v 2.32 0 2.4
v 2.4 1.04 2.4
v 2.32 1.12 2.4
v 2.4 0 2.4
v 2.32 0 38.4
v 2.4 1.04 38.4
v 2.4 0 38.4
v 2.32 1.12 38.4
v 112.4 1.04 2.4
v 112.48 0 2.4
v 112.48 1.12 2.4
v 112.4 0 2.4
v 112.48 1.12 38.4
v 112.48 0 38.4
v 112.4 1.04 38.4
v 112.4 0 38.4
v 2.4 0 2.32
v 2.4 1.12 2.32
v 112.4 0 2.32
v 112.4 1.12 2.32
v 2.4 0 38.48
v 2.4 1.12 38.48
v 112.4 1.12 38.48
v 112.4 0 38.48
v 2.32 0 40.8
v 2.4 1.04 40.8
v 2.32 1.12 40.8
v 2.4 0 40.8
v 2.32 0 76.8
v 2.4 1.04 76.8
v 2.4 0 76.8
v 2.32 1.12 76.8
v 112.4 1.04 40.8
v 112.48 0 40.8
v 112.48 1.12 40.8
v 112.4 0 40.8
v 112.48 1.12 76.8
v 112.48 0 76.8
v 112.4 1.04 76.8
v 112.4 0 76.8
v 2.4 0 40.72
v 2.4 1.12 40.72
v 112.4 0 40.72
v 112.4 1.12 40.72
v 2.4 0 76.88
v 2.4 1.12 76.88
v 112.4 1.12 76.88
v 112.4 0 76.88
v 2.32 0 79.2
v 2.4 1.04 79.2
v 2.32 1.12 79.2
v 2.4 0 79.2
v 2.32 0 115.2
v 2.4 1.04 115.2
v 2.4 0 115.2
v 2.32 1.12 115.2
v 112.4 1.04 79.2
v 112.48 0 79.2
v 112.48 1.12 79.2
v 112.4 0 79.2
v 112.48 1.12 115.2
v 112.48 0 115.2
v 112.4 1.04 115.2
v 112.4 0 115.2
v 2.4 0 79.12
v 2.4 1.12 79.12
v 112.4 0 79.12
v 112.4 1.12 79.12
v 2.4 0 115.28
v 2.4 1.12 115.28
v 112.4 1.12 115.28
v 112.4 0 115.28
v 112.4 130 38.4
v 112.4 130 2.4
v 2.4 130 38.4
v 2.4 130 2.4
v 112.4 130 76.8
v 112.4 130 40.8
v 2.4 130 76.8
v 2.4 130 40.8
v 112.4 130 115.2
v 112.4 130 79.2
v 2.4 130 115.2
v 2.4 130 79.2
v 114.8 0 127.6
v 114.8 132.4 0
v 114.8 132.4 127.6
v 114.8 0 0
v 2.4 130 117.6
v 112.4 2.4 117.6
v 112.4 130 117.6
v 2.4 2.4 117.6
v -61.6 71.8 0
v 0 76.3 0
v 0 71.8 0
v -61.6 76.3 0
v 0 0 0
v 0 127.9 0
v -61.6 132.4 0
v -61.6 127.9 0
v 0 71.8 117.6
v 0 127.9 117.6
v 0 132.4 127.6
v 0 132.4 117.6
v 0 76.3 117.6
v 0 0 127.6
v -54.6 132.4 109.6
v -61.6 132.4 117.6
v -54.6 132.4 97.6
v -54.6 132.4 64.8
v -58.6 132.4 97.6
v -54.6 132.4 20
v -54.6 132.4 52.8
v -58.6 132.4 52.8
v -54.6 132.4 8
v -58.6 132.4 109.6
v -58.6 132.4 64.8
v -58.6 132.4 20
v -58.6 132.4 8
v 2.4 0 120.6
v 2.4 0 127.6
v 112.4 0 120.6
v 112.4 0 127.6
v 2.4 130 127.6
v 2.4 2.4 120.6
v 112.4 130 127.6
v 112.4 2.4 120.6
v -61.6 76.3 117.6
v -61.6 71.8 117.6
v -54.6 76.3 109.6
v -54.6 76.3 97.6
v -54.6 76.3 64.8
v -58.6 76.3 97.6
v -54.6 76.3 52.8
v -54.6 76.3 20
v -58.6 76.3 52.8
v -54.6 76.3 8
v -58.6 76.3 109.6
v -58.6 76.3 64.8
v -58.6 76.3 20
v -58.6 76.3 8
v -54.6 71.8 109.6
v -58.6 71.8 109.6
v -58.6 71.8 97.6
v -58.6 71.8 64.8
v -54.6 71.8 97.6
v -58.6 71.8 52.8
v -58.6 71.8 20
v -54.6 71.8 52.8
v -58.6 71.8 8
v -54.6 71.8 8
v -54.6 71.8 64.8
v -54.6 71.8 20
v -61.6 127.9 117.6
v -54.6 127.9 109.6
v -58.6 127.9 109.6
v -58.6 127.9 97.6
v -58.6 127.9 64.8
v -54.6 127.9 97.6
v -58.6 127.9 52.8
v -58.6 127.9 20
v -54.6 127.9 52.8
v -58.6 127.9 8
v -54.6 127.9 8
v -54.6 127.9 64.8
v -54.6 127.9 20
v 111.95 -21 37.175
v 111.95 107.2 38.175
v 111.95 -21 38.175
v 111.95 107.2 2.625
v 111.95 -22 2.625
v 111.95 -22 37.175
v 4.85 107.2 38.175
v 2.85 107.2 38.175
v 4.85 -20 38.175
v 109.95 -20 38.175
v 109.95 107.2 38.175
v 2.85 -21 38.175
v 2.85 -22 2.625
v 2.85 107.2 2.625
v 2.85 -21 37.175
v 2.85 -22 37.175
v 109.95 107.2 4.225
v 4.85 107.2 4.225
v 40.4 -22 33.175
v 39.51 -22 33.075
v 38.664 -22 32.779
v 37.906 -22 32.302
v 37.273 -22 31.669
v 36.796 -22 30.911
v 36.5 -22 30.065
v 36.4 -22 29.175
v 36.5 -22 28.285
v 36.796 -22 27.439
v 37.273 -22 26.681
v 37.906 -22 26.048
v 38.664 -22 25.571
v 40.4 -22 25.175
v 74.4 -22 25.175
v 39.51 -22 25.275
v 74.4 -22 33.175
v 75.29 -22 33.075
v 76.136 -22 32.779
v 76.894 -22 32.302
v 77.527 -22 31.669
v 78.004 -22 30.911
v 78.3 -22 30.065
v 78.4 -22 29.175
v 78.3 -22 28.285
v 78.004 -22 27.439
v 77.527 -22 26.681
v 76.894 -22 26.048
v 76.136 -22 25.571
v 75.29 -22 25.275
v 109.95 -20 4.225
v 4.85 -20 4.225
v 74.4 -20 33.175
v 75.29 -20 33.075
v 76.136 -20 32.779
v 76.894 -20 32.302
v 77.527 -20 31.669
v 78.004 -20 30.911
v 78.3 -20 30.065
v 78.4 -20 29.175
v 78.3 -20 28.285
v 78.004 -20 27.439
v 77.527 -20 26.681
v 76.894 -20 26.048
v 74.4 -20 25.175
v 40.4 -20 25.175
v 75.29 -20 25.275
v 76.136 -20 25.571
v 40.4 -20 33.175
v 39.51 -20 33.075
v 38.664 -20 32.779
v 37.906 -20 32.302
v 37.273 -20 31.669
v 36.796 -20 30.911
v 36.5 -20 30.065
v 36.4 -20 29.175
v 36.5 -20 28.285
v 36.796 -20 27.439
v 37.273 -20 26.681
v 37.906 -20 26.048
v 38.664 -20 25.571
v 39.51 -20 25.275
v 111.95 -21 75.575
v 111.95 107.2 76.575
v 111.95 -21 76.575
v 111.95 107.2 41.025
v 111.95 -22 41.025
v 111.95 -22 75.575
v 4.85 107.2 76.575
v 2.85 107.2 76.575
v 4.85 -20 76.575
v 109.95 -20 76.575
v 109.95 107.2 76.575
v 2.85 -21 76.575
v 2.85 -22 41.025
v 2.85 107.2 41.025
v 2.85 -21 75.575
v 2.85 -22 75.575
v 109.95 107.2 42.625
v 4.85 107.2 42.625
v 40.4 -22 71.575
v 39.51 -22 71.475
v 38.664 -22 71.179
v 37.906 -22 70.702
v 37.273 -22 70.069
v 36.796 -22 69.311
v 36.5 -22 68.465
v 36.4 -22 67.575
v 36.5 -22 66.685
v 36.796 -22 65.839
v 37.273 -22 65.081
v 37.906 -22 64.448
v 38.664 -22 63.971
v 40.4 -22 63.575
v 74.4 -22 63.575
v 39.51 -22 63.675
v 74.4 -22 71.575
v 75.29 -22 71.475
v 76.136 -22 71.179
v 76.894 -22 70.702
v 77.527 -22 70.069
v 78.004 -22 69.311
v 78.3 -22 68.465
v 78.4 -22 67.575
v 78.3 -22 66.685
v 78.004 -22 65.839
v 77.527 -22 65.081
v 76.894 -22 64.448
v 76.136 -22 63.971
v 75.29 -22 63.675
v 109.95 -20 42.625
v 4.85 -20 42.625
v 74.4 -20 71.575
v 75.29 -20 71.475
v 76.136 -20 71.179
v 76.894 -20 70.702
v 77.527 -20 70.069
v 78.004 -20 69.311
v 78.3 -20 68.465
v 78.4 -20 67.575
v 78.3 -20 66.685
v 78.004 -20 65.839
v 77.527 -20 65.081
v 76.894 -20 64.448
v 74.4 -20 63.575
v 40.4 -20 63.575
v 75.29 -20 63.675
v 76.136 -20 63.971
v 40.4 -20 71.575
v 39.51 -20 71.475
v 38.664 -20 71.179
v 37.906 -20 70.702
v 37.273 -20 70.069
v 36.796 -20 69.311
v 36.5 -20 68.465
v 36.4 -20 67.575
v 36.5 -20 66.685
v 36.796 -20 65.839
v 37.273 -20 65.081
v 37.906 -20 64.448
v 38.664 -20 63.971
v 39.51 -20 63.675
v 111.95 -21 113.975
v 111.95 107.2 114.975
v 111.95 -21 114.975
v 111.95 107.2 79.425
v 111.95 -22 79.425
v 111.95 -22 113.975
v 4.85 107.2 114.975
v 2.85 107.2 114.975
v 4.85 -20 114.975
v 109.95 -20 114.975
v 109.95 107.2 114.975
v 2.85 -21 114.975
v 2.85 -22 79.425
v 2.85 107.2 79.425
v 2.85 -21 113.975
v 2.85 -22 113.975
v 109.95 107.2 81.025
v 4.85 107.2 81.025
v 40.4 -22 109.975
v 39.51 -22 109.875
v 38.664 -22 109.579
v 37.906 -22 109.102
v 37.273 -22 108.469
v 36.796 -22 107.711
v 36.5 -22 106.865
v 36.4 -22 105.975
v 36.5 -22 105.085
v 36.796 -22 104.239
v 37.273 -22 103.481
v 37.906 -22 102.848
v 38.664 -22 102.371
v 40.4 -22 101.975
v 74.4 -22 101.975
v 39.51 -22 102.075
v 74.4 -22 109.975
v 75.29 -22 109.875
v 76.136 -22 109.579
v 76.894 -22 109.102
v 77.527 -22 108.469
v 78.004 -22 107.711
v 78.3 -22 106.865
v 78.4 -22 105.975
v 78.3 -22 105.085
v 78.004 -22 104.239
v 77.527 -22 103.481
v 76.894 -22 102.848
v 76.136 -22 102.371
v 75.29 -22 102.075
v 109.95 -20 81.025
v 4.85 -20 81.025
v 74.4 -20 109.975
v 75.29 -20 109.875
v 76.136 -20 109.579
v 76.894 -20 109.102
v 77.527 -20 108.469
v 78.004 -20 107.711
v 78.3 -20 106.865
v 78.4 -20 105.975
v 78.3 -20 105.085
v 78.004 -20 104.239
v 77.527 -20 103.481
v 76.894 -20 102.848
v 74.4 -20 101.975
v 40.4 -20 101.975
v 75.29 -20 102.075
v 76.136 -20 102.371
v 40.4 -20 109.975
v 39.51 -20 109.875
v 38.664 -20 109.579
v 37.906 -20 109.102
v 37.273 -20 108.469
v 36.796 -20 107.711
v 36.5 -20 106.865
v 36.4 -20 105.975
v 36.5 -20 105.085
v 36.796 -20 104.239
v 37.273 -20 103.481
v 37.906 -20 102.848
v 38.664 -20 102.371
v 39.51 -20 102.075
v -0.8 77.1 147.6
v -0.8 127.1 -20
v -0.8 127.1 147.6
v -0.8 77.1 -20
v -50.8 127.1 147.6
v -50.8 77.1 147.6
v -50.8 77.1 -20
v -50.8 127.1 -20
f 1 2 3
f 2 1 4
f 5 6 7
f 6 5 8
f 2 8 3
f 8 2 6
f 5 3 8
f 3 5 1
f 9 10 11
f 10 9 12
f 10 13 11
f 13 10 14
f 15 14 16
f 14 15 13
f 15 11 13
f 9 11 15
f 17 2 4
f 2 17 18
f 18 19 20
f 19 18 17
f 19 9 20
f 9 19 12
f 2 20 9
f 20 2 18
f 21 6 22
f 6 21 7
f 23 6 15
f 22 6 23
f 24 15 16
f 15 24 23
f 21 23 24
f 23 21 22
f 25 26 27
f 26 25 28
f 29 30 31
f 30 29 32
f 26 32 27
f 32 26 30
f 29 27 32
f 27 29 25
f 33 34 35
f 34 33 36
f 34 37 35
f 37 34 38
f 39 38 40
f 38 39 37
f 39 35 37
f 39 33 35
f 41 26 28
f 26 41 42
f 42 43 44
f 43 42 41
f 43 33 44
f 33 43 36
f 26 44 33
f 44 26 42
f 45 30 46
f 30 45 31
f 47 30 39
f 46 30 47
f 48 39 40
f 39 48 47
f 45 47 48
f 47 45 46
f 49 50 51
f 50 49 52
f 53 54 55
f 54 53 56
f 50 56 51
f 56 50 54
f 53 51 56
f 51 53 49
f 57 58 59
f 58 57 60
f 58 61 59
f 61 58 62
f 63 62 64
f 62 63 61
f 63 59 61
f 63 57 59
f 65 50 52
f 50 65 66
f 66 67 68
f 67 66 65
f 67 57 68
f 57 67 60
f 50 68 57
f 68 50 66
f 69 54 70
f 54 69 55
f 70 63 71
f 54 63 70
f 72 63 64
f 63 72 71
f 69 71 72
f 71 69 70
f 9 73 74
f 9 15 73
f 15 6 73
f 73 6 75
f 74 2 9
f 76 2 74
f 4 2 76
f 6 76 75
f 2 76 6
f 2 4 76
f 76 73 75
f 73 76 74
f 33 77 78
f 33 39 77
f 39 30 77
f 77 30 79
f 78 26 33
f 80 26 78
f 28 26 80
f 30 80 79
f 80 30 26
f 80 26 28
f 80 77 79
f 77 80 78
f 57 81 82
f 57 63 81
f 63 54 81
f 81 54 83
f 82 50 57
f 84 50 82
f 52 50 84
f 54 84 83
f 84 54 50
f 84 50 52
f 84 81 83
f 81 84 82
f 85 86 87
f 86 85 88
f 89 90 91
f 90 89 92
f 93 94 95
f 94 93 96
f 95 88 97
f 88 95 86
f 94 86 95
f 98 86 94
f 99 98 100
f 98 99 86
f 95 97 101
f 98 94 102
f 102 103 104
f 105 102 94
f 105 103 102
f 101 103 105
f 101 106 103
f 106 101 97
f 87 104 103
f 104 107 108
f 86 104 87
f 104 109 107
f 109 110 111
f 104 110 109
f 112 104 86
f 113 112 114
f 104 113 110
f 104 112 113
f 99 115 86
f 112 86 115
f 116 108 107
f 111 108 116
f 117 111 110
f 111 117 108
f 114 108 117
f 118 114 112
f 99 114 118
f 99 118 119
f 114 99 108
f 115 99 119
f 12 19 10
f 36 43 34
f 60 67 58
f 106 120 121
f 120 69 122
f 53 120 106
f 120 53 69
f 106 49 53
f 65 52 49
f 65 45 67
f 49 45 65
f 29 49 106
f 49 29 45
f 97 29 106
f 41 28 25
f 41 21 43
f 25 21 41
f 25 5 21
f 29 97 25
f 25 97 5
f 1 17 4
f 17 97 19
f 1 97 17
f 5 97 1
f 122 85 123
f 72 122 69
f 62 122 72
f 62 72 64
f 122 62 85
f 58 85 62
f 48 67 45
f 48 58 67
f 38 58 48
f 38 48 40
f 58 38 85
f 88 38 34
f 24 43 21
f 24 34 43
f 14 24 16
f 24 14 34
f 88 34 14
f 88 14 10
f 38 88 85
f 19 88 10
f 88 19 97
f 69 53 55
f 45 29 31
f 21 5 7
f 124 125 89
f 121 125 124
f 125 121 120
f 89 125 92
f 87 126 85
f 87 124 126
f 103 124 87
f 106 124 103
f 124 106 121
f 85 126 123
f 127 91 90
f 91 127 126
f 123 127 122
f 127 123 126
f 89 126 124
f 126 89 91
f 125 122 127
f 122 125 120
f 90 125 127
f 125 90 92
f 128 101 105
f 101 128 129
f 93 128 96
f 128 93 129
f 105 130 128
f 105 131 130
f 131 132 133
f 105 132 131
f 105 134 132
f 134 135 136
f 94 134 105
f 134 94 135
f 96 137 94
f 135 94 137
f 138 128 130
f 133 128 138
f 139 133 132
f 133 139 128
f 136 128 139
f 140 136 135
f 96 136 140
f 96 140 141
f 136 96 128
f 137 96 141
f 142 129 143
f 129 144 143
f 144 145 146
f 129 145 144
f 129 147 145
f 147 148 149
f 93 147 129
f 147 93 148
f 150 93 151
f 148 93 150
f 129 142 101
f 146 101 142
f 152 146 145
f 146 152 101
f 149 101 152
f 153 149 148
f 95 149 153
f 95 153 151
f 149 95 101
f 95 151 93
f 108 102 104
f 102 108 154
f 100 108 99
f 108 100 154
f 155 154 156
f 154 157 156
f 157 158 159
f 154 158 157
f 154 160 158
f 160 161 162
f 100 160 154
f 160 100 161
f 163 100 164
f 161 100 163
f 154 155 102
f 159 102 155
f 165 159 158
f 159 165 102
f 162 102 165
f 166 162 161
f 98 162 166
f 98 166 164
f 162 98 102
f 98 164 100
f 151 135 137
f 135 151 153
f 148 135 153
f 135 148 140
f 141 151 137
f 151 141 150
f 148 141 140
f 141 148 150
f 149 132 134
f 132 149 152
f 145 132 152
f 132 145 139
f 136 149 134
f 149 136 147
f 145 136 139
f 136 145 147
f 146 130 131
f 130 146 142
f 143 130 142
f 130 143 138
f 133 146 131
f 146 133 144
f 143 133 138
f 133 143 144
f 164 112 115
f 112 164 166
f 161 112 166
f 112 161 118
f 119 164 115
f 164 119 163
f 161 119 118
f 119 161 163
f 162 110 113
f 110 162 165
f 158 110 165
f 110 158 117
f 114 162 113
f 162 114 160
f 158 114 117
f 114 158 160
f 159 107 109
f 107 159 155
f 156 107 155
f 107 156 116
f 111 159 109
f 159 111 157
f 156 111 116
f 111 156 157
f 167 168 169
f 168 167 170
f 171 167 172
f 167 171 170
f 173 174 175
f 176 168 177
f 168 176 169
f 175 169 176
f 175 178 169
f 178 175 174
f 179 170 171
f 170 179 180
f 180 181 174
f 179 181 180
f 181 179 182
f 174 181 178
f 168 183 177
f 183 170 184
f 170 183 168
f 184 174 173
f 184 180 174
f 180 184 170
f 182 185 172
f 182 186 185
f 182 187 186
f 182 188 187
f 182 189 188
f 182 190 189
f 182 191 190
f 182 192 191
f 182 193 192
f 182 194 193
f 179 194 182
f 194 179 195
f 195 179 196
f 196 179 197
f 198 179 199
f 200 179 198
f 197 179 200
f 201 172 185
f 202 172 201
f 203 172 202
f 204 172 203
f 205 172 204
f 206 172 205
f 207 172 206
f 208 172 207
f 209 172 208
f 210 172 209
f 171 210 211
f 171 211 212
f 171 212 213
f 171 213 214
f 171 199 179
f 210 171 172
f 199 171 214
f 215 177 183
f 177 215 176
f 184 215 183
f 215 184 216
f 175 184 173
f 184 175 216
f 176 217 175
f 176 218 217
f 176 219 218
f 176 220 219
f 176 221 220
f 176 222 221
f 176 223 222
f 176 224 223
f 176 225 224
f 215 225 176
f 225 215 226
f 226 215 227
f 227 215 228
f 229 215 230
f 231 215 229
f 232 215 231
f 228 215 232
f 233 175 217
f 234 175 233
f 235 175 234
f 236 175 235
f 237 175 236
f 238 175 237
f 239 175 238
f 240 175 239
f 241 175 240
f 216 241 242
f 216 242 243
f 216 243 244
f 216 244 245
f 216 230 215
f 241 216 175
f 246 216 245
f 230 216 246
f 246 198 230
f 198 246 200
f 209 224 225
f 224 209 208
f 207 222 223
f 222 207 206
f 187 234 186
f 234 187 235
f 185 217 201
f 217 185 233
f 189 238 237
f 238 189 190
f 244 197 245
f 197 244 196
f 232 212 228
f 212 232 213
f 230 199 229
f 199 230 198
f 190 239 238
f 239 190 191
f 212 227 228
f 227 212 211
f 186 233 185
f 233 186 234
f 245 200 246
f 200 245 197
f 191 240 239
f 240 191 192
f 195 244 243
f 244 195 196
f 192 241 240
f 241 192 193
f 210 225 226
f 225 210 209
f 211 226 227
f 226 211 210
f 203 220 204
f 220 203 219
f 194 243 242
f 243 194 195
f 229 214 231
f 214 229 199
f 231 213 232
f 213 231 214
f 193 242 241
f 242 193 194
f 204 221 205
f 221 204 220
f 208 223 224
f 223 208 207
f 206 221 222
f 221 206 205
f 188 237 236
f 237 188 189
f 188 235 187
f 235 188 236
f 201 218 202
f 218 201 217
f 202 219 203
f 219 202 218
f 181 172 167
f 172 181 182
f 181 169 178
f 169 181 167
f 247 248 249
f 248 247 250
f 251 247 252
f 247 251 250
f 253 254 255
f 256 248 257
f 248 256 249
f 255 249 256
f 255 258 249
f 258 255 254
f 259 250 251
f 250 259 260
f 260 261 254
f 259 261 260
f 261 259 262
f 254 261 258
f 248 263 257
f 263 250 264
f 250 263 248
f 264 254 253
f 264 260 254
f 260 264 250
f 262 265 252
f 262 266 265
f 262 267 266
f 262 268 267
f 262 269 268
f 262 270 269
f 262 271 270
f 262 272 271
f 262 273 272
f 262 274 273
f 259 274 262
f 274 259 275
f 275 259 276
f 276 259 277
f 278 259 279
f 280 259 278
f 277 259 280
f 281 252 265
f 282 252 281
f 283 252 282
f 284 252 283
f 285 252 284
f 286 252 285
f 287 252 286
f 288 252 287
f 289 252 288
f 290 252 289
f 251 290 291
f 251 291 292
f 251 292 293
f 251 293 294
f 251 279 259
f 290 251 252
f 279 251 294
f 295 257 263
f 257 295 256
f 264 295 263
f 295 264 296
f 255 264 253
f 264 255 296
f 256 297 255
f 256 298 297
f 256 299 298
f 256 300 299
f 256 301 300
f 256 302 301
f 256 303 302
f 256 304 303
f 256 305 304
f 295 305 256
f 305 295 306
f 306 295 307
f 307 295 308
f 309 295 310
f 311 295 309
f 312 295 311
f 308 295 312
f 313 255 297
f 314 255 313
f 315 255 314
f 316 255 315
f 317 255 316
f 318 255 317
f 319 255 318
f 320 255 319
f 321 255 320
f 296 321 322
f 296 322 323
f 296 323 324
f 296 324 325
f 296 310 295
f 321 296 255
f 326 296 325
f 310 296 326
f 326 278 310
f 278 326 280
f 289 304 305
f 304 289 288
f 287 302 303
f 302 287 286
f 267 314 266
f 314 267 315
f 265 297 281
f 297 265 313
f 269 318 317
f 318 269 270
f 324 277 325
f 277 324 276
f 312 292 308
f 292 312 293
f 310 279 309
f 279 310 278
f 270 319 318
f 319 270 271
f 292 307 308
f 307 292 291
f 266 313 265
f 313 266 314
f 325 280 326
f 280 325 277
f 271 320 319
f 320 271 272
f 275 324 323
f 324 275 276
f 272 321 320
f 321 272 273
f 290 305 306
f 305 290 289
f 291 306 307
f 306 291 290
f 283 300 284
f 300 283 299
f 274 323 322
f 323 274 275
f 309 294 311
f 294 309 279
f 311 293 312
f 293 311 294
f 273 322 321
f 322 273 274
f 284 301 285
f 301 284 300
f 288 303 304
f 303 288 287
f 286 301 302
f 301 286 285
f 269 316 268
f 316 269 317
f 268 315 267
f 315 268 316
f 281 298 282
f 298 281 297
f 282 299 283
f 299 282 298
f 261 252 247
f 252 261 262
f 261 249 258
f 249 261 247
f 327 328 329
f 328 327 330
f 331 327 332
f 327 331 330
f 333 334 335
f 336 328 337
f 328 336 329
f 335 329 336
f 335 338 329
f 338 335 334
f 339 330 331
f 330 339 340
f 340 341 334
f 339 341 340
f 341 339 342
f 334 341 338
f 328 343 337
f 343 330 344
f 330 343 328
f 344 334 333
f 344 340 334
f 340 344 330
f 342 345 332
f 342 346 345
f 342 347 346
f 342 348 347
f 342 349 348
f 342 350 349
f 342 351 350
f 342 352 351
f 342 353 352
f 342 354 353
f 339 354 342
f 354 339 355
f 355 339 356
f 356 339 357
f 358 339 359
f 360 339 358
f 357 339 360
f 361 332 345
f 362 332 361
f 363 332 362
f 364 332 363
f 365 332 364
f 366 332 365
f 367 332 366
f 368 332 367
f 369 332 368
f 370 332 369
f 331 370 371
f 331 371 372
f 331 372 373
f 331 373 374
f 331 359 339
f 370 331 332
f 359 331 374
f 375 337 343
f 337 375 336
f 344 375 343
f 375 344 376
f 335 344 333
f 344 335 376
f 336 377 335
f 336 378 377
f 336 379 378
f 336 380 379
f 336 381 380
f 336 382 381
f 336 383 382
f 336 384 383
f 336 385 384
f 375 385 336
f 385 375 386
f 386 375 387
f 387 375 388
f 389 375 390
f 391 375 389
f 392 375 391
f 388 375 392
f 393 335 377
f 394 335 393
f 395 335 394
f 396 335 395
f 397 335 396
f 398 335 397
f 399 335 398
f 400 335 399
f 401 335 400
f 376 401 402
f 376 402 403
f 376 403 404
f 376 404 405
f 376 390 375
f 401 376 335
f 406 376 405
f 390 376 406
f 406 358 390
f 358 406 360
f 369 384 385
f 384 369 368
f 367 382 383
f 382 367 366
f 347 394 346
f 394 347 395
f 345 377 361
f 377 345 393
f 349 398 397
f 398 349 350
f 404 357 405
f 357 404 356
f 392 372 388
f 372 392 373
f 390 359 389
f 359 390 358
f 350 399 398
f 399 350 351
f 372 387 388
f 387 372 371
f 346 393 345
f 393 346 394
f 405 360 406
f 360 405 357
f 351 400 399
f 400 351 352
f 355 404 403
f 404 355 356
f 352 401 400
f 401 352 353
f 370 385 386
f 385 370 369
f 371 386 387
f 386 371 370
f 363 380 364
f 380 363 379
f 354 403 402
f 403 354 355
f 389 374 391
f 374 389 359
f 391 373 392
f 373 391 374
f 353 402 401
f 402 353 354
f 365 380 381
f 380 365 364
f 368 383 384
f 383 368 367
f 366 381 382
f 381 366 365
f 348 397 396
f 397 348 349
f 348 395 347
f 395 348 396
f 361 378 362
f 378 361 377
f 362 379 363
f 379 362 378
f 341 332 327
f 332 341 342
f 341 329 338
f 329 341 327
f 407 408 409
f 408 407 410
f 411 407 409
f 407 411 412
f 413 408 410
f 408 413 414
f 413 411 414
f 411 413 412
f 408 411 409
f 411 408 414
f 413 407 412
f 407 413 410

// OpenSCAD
// Table-leg zip-tie drawer set
// Housing and drawers are separate printable parts.
// Housing prints with drawer openings UP (back of housing on the bed).
// Drawers print bottom-down.
// Always sized for a Bambu Lab H2D single-nozzle envelope:
//   320 x 315 x 320 mm (5 mm margin under 325 x 320 x 325).
//
// Customizer: set Part, then Render (F6) and export STL.
// CLI example:
//   openscad -D part='"housing_print"' -D drawer_count=3 -o housing.stl leg-drawers.scad

/* [Part] */
// assembled = in-use pose with drawers and a ghost table leg
// exploded  = housing plus drawers pulled forward
// housing / drawer = in-use orientation (for drawings)
// housing_print / drawer_print = print orientation (export these)
part = "assembled"; // [assembled, exploded, housing, drawer, housing_print, drawer_print, dims]

/* [Drawers] */
drawer_count  = 3;    // [1:8]
drawer_height = 36;   // mm, inner cavity height of each bay
drawer_width  = 110;  // mm, inner cavity width (left-right)
drawer_depth  = 130;  // mm, inner cavity depth (front-back)

/* [Table leg] */
leg_x       = 50;    // mm, leg cross-section along housing width
leg_y       = 50;    // mm, leg cross-section along housing depth
leg_on_left = true;  // true = mount on left of housing, false = right

/* [Top ledges] */
// Raised tray walls on top of the housing. 0 = no wall on that edge.
ledge_left  = 10;
ledge_right = 10;
ledge_back  = 10;
ledge_front = 3;

/* [Structure] */
wall            = 2.4;  // mm, housing walls, bay floors, top plate
drawer_wall     = 2.0;  // mm, drawer side walls
drawer_floor    = 1.6;  // mm, drawer floor
slide_gap       = 0.45; // mm, per-side clearance in the bay
back_gap        = 0.8;  // mm, drawer shorter than cavity so it does not hit the back
leg_clearance   = 0.8;  // mm, per-side pocket clearance around the leg
mount_arm       = 4.5;  // mm, thickness of the front and back wrap walls (Y)
mount_outset    = 10.0; // mm the wrap extends past the far face of the leg
zip_tie_count   = 0;    // 0 = auto from housing height
zip_hole_w      = 4.0;  // mm, hole width (X) in the 10 mm tab
zip_hole_h      = 12.0; // mm, hole height (Z); hole goes front-to-back through both walls
show_context    = true; // ghost table leg in assembled / exploded views
show_table      = false; // thin table-top slab above the ledges (mounted-under-desk view)

$fn = 28;
eps = 0.08;

// ---- derived ----
cav_w = drawer_width;
cav_h = drawer_height;
cav_d = drawer_depth;

body_w = cav_w + 2 * wall;
body_d = cav_d + wall;
body_h = drawer_count * cav_h + (drawer_count + 1) * wall;

inner_x = leg_x + 2 * leg_clearance;
inner_y = leg_y + 2 * leg_clearance;
mount_x_span = inner_x + mount_outset;
mount_y_span = body_d;
// Wrap sits at the back of the housing so the back wall prints on the bed.
y_back_wall  = body_d - mount_arm;
y_front_wall = y_back_wall - inner_y - mount_arm;

ledge_max = max(max(ledge_left, ledge_right), max(ledge_back, ledge_front));

housing_print_x = body_w + mount_x_span;
housing_print_y = body_h + ledge_max;
housing_print_z = mount_y_span;

dw = cav_w - 2 * slide_gap;
dh = cav_h - slide_gap;
dd = cav_d - back_gap;

drawer_print_x = dw;
drawer_print_y = dd;
drawer_print_z = dh;

H2D_X = 320;
H2D_Y = 315;
H2D_Z = 320;

auto_zips = zip_tie_count > 0
    ? zip_tie_count
    : (body_h < 80 ? 2 : (body_h < 170 ? 3 : 4));

function bay_z(i) = wall + i * (cav_h + wall);

function zip_z(i, n) =
    let (margin = 14,
         span   = body_h - 2 * margin,
         step   = n <= 1 ? 0 : span / (n - 1))
    margin + i * step;

module h2d_guard() {
    assert(housing_print_x <= H2D_X,
        str("housing print X ", housing_print_x, " mm exceeds H2D ", H2D_X, " mm"));
    assert(housing_print_y <= H2D_Y,
        str("housing print Y ", housing_print_y, " mm exceeds H2D ", H2D_Y, " mm"));
    assert(housing_print_z <= H2D_Z,
        str("housing print Z ", housing_print_z, " mm exceeds H2D ", H2D_Z, " mm"));
    assert(drawer_print_x <= H2D_X,
        str("drawer print X ", drawer_print_x, " mm exceeds H2D ", H2D_X, " mm"));
    assert(drawer_print_y <= H2D_Y,
        str("drawer print Y ", drawer_print_y, " mm exceeds H2D ", H2D_Y, " mm"));
    assert(drawer_print_z <= H2D_Z,
        str("drawer print Z ", drawer_print_z, " mm exceeds H2D ", H2D_Z, " mm"));
    assert(dw > 2 * drawer_wall + 8, "drawer too narrow");
    assert(dh > drawer_floor + 8, "drawer too short");
    assert(dd > drawer_wall + 8, "drawer too shallow");
}

module housing_shell() {
    difference() {
        cube([body_w, body_d, body_h]);
        for (i = [0 : drawer_count - 1]) {
            translate([wall, -eps, bay_z(i)])
                cube([cav_w, cav_d + eps, cav_h]);
            // 45-degree flare at the opening so the drawer starts easily.
            // Opening is at y=0, which becomes the top of the print.
            translate([wall, 0, bay_z(i)])
                chamfer_opening(cav_w, cav_h, 1.2);
        }
    }
}

module chamfer_opening(w, h, c) {
    // Triangular prism along the four edges of the front opening.
    translate([0, -eps, 0])
        rotate([0, 0, 0])
            linear_extrude(height = h)
                polygon([[-eps, -eps], [c, -eps], [-eps, c]]);
    translate([w, -eps, 0])
        linear_extrude(height = h)
            polygon([[eps, -eps], [-c, -eps], [eps, c]]);
    translate([0, -eps, 0])
        rotate([0, 90, 0])
            linear_extrude(height = w)
                polygon([[eps, -eps], [-c, -eps], [eps, c]]);
    translate([0, -eps, h])
        rotate([0, 90, 0])
            linear_extrude(height = w)
                polygon([[-eps, -eps], [c, -eps], [-eps, c]]);
}

module ledges() {
    if (ledge_left > 0)
        translate([0, 0, body_h - eps])
            cube([wall, body_d, ledge_left + eps]);
    if (ledge_right > 0)
        translate([body_w - wall, 0, body_h - eps])
            cube([wall, body_d, ledge_right + eps]);
    if (ledge_back > 0)
        translate([0, body_d - wall, body_h - eps])
            cube([body_w, wall, ledge_back + eps]);
    if (ledge_front > 0)
        translate([0, 0, body_h - eps])
            cube([body_w, wall, ledge_front + eps]);
}

module zip_holes_in_wall(y_wall) {
    // 4 mm wide x 12 mm high, through the wall front-to-back (Y).
    // Centered in the 10 mm tab past the far face of the table leg.
    n = auto_zips;
    x0 = -inner_x - mount_outset / 2 - zip_hole_w / 2;
    for (i = [0 : n - 1]) {
        translate([x0, y_wall - eps, zip_z(i, n) - zip_hole_h / 2])
            cube([zip_hole_w, mount_arm + 2 * eps, zip_hole_h]);
    }
}

module mount_left() {
    // U-wrap on the side of the housing: front wall + back wall around
    // the table leg, plus a 10 mm tab past the far face. A 4 x 12 mm
    // hole through both walls (front to back) takes the zip tie.
    ox = -mount_x_span;
    yf = y_front_wall;
    yb = y_back_wall;
    difference() {
        union() {
            translate([ox, yf, 0])
                cube([mount_x_span, mount_arm, body_h]);
            translate([ox, yb, 0])
                cube([mount_x_span, mount_arm, body_h]);
        }
        zip_holes_in_wall(yf);
        zip_holes_in_wall(yb);
    }
}

module mount() {
    if (leg_on_left)
        mount_left();
    else
        translate([body_w, 0, 0])
            mirror([1, 0, 0])
                mount_left();
}

module housing() {
    h2d_guard();
    union() {
        housing_shell();
        ledges();
        mount();
    }
}

module drawer_finger_slot() {
    slot_h = min(8, dh - drawer_floor - 6);
    slot_w = min(42, dw * 0.42);
    if (slot_h >= 5 && slot_w >= 16) {
        zc = dh - 5 - slot_h / 2;
        hull() {
            translate([dw / 2 - slot_w / 2 + slot_h / 2, -eps, zc])
                rotate([-90, 0, 0])
                    cylinder(d = slot_h, h = drawer_wall + 2 * eps);
            translate([dw / 2 + slot_w / 2 - slot_h / 2, -eps, zc])
                rotate([-90, 0, 0])
                    cylinder(d = slot_h, h = drawer_wall + 2 * eps);
        }
    }
}

module drawer() {
    h2d_guard();
    difference() {
        cube([dw, dd, dh]);
        translate([drawer_wall, drawer_wall, drawer_floor])
            cube([
                dw - 2 * drawer_wall,
                dd - drawer_wall + eps,
                dh - drawer_floor + eps
            ]);
        drawer_finger_slot();
        // light chamfer on the outer front top edge for insertion
        translate([-eps, -eps, dh - 1.0])
            cube([dw + 2 * eps, 1.0 + eps, 1.0 + eps]);
    }
}

module drawers_in_place(pull = 18) {
    for (i = [0 : drawer_count - 1]) {
        translate([
            wall + slide_gap,
            -pull,
            bay_z(i) + slide_gap / 2
        ])
            drawer();
    }
}

module ghost_leg() {
    // Ghost of the table leg in the U-pocket, plus a hint of table top.
    gx = inner_x - 2 * leg_clearance;
    gy = inner_y - 2 * leg_clearance;
    gz = body_h + ledge_max + 40;
    xoff = leg_on_left
        ? -inner_x + leg_clearance
        : body_w + leg_clearance;
    yoff = body_d - mount_arm - inner_y + leg_clearance;
    translate([xoff, yoff, -20])
        cube([gx, gy, gz]);
    if (show_table) {
        overhang = 30;
        translate([-overhang, -overhang, body_h + ledge_max + 8])
            cube([body_w + 2 * overhang, body_d + 2 * overhang, 16]);
    }
}

module assembled() {
    h2d_guard();
    color("BurlyWood")
        render(convexity = 12)
            housing();
    color("SteelBlue")
        render(convexity = 8)
            drawers_in_place(22);
    if (show_context) {
        color([0.45, 0.28, 0.16, 0.28])
            ghost_leg();
    }
}

module exploded() {
    h2d_guard();
    color("BurlyWood")
        render(convexity = 12)
            housing();
    for (i = [0 : drawer_count - 1]) {
        translate([
            wall + slide_gap,
            -35 - i * (14),
            bay_z(i) + slide_gap / 2
        ])
            color("SteelBlue")
                render(convexity = 8)
                    drawer();
    }
}

module housing_print() {
    // Openings up: back of housing on the bed, front openings at +Z.
    h2d_guard();
    translate([leg_on_left ? mount_x_span : 0, 0, mount_y_span])
        rotate([-90, 0, 0])
            housing();
}

module drawer_print() {
    h2d_guard();
    drawer();
}

module emit_dims() {
    echo(str("JSON:{",
        "\"body_w\":", body_w, ",",
        "\"body_d\":", body_d, ",",
        "\"body_h\":", body_h, ",",
        "\"mount_x_span\":", mount_x_span, ",",
        "\"mount_y_span\":", mount_y_span, ",",
        "\"housing_print_x\":", housing_print_x, ",",
        "\"housing_print_y\":", housing_print_y, ",",
        "\"housing_print_z\":", housing_print_z, ",",
        "\"drawer_print_x\":", drawer_print_x, ",",
        "\"drawer_print_y\":", drawer_print_y, ",",
        "\"drawer_print_z\":", drawer_print_z, ",",
        "\"dw\":", dw, ",",
        "\"dh\":", dh, ",",
        "\"dd\":", dd, ",",
        "\"auto_zips\":", auto_zips, ",",
        "\"mount_outset\":", mount_outset, ",",
        "\"zip_hole_w\":", zip_hole_w, ",",
        "\"zip_hole_h\":", zip_hole_h, ",",
        "\"ledge_max\":", ledge_max,
    "}"));
    cube(0.01);
}

if (part == "assembled")
    assembled();
else if (part == "exploded")
    exploded();
else if (part == "housing")
    housing();
else if (part == "drawer")
    drawer();
else if (part == "housing_print")
    housing_print();
else if (part == "drawer_print")
    drawer_print();
else if (part == "dims")
    emit_dims();
else
    assembled();
